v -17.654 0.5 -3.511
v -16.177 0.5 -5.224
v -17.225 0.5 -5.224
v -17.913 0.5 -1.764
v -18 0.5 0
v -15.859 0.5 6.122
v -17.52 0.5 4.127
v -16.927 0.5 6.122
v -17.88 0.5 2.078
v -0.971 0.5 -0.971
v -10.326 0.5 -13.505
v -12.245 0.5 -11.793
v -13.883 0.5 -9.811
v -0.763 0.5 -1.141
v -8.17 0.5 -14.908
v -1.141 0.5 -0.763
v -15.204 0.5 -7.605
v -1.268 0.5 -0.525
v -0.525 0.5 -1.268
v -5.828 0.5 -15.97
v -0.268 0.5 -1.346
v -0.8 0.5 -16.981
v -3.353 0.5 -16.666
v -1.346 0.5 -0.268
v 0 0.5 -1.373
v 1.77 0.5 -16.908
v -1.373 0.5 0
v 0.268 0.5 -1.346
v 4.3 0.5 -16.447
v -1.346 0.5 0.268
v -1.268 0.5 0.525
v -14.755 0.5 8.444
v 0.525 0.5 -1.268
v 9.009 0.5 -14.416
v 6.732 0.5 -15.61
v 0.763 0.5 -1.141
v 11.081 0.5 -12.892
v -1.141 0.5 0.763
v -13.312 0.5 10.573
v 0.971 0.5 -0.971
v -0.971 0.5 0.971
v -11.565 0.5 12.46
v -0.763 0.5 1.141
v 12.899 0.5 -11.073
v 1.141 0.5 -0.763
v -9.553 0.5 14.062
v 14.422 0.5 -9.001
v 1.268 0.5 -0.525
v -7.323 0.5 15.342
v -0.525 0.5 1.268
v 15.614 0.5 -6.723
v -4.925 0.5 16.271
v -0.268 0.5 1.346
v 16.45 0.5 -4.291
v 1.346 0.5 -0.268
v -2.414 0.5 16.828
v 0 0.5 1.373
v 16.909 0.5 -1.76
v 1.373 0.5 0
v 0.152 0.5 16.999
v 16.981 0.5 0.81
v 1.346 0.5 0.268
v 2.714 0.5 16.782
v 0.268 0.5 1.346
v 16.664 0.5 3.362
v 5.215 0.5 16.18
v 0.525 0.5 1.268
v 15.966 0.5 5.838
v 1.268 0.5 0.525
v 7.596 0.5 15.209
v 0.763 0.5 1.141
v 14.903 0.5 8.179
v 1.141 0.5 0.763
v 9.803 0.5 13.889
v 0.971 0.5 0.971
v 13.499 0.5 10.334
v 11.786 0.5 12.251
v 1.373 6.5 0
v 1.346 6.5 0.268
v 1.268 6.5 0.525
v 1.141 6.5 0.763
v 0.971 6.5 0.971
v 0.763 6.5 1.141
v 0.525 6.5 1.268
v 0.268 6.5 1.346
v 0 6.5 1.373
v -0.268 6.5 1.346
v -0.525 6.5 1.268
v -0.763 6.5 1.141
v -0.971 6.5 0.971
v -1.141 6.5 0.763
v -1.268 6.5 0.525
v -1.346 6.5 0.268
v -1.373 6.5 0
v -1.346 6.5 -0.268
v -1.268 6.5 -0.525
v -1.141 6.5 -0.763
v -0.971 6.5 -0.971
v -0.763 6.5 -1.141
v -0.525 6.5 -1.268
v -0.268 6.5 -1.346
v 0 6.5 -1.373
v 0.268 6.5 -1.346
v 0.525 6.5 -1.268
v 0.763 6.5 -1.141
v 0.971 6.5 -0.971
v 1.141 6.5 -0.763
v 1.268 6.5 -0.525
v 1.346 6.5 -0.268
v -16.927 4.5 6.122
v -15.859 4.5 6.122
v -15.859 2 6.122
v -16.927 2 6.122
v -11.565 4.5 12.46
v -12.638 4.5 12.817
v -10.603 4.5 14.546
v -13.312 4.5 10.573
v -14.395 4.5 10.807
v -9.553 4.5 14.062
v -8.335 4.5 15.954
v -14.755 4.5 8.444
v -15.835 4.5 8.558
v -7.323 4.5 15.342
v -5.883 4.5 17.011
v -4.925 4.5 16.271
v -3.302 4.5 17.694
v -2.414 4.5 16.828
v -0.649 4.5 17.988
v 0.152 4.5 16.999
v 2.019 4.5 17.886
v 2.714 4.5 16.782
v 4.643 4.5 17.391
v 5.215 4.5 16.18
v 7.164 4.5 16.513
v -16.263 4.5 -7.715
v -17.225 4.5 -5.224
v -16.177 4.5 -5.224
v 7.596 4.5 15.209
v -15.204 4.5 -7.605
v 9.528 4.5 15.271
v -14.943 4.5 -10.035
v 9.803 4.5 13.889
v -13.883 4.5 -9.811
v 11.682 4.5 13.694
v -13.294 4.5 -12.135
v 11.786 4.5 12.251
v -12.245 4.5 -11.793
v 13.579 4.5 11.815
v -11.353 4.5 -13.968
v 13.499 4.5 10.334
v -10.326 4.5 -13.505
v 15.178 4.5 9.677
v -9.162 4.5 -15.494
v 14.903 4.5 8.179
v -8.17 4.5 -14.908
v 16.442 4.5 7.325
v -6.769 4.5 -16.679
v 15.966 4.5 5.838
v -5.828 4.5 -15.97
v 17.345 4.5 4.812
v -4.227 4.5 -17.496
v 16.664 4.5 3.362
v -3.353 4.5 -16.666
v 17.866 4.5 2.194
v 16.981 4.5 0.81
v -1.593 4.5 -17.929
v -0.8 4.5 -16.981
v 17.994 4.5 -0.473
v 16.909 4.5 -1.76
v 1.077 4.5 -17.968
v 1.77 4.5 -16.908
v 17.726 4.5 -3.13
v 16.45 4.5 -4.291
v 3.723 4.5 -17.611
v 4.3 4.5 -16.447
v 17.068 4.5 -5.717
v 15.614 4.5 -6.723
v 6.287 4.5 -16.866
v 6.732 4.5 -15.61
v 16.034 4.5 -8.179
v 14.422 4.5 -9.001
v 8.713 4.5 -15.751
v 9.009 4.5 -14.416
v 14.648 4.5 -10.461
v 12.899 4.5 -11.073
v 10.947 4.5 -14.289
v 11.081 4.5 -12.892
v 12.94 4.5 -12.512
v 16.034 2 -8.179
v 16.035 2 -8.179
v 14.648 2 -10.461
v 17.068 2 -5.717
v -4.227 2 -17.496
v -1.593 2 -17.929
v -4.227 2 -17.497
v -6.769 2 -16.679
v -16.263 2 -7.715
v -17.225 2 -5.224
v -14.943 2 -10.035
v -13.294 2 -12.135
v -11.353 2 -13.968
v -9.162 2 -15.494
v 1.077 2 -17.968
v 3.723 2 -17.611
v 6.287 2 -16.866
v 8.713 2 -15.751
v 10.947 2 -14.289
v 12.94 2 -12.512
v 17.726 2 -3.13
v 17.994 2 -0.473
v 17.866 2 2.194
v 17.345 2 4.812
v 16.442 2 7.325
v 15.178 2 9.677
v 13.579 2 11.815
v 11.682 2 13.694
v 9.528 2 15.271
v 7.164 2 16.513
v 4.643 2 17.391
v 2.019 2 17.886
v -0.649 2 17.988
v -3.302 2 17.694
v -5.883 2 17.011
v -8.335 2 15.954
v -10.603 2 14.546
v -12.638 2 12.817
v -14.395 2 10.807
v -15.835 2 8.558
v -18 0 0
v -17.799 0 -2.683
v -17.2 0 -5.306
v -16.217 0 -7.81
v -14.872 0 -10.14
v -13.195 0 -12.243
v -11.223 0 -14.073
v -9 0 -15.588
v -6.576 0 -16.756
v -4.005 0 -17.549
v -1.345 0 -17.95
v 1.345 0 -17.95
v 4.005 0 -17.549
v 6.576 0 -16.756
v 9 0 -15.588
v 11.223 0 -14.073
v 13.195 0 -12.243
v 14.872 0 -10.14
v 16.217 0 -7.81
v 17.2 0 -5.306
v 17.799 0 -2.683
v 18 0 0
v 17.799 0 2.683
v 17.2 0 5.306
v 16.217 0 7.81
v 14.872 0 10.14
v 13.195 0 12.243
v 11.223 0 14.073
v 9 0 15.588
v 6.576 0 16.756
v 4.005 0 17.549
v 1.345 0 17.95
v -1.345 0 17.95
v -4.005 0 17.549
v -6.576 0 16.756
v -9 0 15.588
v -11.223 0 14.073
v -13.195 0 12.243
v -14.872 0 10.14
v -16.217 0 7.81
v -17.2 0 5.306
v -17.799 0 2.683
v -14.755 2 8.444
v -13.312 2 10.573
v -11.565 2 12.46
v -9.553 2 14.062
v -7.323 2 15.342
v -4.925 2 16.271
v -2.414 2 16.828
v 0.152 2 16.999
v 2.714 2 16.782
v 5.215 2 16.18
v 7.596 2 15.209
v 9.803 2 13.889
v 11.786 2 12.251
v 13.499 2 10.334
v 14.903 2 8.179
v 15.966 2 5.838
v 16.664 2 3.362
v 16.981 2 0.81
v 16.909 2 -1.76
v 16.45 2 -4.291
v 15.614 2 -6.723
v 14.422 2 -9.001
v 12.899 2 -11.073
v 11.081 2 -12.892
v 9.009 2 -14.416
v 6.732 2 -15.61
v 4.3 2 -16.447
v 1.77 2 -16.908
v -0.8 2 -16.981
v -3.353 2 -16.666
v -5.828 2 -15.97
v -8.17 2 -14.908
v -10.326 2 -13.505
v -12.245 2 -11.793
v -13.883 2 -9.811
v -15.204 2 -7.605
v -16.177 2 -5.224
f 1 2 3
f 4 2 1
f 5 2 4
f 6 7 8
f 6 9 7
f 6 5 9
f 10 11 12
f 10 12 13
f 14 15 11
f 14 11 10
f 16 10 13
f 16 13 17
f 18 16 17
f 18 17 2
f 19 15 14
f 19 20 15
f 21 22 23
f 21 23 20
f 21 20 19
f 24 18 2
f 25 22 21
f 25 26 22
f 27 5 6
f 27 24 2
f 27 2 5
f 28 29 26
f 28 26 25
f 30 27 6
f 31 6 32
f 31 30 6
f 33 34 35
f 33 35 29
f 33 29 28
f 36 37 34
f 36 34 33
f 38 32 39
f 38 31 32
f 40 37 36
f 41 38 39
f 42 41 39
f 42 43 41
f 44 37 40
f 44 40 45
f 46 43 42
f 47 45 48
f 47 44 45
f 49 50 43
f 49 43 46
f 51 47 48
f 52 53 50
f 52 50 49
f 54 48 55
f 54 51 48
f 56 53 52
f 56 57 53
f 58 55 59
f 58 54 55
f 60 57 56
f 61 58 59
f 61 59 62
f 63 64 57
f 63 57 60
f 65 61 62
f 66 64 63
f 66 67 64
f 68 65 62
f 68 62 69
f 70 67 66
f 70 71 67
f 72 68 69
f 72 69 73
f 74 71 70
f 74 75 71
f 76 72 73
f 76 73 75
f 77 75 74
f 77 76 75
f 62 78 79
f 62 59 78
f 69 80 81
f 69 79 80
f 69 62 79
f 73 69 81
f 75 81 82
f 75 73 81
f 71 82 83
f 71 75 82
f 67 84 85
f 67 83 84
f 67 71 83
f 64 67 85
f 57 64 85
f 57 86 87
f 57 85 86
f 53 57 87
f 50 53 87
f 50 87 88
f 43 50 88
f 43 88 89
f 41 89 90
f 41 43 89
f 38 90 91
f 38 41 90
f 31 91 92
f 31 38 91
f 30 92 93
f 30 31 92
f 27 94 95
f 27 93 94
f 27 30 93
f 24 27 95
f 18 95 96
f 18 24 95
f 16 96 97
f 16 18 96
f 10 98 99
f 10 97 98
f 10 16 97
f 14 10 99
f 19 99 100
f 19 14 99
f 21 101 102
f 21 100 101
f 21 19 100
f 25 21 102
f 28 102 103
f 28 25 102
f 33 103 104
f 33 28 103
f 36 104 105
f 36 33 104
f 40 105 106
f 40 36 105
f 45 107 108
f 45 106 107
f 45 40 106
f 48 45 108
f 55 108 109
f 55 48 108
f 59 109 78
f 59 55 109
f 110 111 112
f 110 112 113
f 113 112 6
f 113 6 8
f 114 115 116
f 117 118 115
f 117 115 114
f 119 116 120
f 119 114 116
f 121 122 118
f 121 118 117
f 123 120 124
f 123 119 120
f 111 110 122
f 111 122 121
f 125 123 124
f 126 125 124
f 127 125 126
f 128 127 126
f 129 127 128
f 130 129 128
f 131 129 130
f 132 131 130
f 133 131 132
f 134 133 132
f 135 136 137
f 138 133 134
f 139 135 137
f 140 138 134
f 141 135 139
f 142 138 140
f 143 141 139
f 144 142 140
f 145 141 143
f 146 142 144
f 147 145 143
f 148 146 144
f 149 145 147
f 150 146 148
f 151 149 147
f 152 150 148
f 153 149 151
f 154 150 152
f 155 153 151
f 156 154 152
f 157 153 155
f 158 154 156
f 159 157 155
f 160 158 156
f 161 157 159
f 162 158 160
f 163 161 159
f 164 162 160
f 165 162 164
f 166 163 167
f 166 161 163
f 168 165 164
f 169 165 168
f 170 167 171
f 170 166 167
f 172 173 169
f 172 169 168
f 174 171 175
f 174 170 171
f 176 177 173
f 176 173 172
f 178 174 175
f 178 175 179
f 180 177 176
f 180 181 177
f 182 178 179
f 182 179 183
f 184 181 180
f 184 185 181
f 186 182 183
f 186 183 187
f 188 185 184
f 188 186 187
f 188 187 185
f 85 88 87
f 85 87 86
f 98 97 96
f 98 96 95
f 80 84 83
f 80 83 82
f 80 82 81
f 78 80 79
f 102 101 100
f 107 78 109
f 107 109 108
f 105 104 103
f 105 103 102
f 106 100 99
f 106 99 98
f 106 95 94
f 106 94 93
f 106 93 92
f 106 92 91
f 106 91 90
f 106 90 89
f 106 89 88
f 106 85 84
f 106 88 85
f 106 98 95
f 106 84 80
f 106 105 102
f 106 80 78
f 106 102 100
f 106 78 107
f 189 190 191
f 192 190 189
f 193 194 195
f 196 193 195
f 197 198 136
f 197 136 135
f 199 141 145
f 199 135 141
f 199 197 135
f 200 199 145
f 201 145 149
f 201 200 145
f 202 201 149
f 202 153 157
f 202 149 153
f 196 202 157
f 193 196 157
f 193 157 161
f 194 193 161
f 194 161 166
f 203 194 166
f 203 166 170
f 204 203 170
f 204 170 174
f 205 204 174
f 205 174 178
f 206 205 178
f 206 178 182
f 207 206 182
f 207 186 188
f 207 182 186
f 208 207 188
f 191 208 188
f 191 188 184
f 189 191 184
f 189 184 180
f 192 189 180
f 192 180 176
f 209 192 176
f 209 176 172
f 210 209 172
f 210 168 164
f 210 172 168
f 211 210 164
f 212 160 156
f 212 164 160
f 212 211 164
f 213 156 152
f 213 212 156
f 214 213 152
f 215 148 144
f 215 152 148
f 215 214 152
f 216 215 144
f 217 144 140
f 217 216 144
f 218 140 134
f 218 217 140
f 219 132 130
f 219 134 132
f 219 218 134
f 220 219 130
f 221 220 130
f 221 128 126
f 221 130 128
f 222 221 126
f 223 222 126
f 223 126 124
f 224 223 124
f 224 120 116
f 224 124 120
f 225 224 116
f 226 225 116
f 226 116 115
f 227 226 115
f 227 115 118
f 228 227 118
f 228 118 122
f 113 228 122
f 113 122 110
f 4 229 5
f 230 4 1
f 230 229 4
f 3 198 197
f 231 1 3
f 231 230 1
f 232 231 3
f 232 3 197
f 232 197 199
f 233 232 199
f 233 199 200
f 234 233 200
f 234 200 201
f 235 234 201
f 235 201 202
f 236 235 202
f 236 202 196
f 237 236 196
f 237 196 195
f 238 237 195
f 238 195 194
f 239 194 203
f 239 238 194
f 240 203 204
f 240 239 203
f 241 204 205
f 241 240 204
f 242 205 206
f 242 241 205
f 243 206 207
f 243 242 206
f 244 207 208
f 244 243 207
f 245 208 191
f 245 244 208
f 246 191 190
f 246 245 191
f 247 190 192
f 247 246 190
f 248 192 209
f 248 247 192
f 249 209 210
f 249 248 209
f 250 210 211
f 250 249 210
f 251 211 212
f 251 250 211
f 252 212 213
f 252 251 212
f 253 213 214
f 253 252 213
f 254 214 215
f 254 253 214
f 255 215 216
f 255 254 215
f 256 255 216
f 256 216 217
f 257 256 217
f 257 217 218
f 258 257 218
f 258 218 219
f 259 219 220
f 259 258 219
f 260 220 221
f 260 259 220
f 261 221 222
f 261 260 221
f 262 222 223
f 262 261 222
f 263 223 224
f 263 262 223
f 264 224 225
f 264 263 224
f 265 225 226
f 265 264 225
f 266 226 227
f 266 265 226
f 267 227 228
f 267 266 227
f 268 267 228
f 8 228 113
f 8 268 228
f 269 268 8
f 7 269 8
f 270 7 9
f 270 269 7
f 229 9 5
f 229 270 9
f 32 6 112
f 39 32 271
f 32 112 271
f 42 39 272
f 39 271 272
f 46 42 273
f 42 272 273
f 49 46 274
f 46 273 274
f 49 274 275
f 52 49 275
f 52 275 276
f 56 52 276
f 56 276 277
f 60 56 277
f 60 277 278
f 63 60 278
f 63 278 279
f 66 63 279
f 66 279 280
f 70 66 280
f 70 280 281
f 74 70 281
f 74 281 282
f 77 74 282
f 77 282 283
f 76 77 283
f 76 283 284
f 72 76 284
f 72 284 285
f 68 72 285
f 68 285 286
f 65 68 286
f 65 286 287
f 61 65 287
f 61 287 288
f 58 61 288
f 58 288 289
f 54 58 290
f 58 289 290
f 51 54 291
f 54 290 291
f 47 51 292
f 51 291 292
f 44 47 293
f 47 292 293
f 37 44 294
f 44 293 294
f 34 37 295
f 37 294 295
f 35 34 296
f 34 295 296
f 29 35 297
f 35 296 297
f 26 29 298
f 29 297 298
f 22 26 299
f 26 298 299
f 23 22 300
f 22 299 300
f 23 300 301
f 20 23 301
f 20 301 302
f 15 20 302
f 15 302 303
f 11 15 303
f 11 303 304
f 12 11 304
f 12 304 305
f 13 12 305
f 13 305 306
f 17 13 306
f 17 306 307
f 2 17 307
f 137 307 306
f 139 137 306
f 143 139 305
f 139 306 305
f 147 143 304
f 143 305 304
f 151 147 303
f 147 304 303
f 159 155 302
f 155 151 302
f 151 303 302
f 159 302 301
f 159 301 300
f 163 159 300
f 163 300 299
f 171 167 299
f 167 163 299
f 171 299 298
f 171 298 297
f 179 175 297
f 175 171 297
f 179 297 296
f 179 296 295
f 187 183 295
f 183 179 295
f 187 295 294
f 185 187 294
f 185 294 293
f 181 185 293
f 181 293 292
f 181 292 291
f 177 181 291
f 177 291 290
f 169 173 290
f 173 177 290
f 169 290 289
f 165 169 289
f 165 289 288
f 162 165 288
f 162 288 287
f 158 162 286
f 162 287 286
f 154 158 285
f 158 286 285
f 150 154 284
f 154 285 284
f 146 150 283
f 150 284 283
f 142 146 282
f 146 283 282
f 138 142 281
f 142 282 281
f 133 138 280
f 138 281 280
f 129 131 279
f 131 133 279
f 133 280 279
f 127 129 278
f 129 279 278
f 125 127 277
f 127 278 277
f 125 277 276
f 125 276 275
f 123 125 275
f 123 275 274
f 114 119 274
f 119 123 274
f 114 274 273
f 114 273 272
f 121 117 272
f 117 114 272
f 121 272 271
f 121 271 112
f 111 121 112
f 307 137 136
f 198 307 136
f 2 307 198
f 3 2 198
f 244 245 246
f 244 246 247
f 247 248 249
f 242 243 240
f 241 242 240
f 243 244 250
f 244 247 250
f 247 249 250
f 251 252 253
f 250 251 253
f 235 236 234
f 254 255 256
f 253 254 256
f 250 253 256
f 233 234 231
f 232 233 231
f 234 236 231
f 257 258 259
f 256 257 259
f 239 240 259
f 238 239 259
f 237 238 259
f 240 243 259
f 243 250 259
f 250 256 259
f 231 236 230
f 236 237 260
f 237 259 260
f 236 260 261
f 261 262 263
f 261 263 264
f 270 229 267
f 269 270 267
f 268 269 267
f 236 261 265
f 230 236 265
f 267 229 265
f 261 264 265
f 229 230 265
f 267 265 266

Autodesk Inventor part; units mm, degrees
ref_plane "YZ Plane" through (0, 0, 0) normal (1, 0, 0) x (0, 1, 0)
ref_plane "XZ Plane" through (0, 0, 0) normal (0, 1, 0) x (-1, 0, 0)
ref_plane "XY Plane" through (0, 0, 0) normal (0, 0, 1) x (1, 0, 0)
sketch "Sketch1" plane through (0, 0, 0) normal (0, 1, 0) x (-1, 0, 0)
  circle A0 centre (0, 0) radius 18
  dimension "d1" = 36
extrude "Extrusion1" add sketch "Sketch1" along normal blind 2
sketch "Sketch2" plane through (0, 2, 0) normal (0, 1, 0) x (1, 0, 0)
  circle A0 centre (0, 0) radius 17
  dimension "d4" = 34
extrude "Extrusion2" cut sketch "Sketch2" against normal blind 1.5
ref_plane "Work Plane1" through (-9.8347, 0.5, -3.688) normal (-1, 0, 0) x (0, 0, 1)
sketch "Sketch5" plane through (-9.8347, 0.5, -3.688) normal (-1, 0, 0) x (0, 0, 1)
  point P0 (3.688, -0.5)
ref_plane "Work Plane4" through (-9.8347, 0.5, -3.688) normal (-1, 0, 0) x (0, 0, 1)
sketch "Sketch6" plane through (-9.8347, 0.5, -3.688) normal (-1, 0, 0) x (0, 0, 1)
  line L0 (-13.312, 0) -> (20.688, 0) projected
  line L1 (21.688, 1.5) -> (-14.312, 1.5) projected
  line L2 (-1.5361, 0) -> (9.81, 0)
  line L3 (9.81, 0) -> (9.81, 1.5)
  line L4 (9.81, 1.5) -> (-1.5361, 1.5)
  line L5 (-1.5361, 1.5) -> (-1.5361, 0)
  point P0 (3.688, -0.5)
extrude "Extrusion4" cut sketch "Sketch6" along normal blind 15
sketch "Sketch8" plane through (0, 2, 0) normal (0, 1, 0) x (1, 0, 0)
  arc A0 (-16.9269, -6.122) -> (-17.2252, 5.2241) centre (0, 0) ccw projected
  line L0 (-15.8594, -6.122) -> (-16.9269, -6.122) projected
  line L1 (-16.9269, -6.122) -> (-15.8594, -6.122)
  arc A1 (-15.8594, -6.122) -> (-16.1774, 5.2241) centre (0, 0) ccw projected
  arc A2 (-15.8594, -6.122) -> (-16.1774, 5.2241) centre (0, 0) ccw
  arc A3 (-16.9269, -6.122) -> (-17.2252, 5.2241) centre (0, 0) ccw
  arc A4 (-17.2252, 5.2241) -> (-16.9269, -6.122) centre (0, 0) ccw projected
  line L2 (-16.1774, 5.2241) -> (-17.2252, 5.2241) projected
  line L3 (-17.2252, 5.2241) -> (-16.1774, 5.2241)
extrude "Extrusion5" add sketch "Sketch8" along normal blind 2.5 contours L0 A1 L2 A0
sketch "Sketch9" plane through (0, 0.5, 0) normal (0, 1, 0) x (1, 0, 0)
  circle A0 centre (0, 0) radius 1.3727
extrude "Extrusion6" add sketch "Sketch9" along normal blind 6
properties part number "watchChargerBottom"
